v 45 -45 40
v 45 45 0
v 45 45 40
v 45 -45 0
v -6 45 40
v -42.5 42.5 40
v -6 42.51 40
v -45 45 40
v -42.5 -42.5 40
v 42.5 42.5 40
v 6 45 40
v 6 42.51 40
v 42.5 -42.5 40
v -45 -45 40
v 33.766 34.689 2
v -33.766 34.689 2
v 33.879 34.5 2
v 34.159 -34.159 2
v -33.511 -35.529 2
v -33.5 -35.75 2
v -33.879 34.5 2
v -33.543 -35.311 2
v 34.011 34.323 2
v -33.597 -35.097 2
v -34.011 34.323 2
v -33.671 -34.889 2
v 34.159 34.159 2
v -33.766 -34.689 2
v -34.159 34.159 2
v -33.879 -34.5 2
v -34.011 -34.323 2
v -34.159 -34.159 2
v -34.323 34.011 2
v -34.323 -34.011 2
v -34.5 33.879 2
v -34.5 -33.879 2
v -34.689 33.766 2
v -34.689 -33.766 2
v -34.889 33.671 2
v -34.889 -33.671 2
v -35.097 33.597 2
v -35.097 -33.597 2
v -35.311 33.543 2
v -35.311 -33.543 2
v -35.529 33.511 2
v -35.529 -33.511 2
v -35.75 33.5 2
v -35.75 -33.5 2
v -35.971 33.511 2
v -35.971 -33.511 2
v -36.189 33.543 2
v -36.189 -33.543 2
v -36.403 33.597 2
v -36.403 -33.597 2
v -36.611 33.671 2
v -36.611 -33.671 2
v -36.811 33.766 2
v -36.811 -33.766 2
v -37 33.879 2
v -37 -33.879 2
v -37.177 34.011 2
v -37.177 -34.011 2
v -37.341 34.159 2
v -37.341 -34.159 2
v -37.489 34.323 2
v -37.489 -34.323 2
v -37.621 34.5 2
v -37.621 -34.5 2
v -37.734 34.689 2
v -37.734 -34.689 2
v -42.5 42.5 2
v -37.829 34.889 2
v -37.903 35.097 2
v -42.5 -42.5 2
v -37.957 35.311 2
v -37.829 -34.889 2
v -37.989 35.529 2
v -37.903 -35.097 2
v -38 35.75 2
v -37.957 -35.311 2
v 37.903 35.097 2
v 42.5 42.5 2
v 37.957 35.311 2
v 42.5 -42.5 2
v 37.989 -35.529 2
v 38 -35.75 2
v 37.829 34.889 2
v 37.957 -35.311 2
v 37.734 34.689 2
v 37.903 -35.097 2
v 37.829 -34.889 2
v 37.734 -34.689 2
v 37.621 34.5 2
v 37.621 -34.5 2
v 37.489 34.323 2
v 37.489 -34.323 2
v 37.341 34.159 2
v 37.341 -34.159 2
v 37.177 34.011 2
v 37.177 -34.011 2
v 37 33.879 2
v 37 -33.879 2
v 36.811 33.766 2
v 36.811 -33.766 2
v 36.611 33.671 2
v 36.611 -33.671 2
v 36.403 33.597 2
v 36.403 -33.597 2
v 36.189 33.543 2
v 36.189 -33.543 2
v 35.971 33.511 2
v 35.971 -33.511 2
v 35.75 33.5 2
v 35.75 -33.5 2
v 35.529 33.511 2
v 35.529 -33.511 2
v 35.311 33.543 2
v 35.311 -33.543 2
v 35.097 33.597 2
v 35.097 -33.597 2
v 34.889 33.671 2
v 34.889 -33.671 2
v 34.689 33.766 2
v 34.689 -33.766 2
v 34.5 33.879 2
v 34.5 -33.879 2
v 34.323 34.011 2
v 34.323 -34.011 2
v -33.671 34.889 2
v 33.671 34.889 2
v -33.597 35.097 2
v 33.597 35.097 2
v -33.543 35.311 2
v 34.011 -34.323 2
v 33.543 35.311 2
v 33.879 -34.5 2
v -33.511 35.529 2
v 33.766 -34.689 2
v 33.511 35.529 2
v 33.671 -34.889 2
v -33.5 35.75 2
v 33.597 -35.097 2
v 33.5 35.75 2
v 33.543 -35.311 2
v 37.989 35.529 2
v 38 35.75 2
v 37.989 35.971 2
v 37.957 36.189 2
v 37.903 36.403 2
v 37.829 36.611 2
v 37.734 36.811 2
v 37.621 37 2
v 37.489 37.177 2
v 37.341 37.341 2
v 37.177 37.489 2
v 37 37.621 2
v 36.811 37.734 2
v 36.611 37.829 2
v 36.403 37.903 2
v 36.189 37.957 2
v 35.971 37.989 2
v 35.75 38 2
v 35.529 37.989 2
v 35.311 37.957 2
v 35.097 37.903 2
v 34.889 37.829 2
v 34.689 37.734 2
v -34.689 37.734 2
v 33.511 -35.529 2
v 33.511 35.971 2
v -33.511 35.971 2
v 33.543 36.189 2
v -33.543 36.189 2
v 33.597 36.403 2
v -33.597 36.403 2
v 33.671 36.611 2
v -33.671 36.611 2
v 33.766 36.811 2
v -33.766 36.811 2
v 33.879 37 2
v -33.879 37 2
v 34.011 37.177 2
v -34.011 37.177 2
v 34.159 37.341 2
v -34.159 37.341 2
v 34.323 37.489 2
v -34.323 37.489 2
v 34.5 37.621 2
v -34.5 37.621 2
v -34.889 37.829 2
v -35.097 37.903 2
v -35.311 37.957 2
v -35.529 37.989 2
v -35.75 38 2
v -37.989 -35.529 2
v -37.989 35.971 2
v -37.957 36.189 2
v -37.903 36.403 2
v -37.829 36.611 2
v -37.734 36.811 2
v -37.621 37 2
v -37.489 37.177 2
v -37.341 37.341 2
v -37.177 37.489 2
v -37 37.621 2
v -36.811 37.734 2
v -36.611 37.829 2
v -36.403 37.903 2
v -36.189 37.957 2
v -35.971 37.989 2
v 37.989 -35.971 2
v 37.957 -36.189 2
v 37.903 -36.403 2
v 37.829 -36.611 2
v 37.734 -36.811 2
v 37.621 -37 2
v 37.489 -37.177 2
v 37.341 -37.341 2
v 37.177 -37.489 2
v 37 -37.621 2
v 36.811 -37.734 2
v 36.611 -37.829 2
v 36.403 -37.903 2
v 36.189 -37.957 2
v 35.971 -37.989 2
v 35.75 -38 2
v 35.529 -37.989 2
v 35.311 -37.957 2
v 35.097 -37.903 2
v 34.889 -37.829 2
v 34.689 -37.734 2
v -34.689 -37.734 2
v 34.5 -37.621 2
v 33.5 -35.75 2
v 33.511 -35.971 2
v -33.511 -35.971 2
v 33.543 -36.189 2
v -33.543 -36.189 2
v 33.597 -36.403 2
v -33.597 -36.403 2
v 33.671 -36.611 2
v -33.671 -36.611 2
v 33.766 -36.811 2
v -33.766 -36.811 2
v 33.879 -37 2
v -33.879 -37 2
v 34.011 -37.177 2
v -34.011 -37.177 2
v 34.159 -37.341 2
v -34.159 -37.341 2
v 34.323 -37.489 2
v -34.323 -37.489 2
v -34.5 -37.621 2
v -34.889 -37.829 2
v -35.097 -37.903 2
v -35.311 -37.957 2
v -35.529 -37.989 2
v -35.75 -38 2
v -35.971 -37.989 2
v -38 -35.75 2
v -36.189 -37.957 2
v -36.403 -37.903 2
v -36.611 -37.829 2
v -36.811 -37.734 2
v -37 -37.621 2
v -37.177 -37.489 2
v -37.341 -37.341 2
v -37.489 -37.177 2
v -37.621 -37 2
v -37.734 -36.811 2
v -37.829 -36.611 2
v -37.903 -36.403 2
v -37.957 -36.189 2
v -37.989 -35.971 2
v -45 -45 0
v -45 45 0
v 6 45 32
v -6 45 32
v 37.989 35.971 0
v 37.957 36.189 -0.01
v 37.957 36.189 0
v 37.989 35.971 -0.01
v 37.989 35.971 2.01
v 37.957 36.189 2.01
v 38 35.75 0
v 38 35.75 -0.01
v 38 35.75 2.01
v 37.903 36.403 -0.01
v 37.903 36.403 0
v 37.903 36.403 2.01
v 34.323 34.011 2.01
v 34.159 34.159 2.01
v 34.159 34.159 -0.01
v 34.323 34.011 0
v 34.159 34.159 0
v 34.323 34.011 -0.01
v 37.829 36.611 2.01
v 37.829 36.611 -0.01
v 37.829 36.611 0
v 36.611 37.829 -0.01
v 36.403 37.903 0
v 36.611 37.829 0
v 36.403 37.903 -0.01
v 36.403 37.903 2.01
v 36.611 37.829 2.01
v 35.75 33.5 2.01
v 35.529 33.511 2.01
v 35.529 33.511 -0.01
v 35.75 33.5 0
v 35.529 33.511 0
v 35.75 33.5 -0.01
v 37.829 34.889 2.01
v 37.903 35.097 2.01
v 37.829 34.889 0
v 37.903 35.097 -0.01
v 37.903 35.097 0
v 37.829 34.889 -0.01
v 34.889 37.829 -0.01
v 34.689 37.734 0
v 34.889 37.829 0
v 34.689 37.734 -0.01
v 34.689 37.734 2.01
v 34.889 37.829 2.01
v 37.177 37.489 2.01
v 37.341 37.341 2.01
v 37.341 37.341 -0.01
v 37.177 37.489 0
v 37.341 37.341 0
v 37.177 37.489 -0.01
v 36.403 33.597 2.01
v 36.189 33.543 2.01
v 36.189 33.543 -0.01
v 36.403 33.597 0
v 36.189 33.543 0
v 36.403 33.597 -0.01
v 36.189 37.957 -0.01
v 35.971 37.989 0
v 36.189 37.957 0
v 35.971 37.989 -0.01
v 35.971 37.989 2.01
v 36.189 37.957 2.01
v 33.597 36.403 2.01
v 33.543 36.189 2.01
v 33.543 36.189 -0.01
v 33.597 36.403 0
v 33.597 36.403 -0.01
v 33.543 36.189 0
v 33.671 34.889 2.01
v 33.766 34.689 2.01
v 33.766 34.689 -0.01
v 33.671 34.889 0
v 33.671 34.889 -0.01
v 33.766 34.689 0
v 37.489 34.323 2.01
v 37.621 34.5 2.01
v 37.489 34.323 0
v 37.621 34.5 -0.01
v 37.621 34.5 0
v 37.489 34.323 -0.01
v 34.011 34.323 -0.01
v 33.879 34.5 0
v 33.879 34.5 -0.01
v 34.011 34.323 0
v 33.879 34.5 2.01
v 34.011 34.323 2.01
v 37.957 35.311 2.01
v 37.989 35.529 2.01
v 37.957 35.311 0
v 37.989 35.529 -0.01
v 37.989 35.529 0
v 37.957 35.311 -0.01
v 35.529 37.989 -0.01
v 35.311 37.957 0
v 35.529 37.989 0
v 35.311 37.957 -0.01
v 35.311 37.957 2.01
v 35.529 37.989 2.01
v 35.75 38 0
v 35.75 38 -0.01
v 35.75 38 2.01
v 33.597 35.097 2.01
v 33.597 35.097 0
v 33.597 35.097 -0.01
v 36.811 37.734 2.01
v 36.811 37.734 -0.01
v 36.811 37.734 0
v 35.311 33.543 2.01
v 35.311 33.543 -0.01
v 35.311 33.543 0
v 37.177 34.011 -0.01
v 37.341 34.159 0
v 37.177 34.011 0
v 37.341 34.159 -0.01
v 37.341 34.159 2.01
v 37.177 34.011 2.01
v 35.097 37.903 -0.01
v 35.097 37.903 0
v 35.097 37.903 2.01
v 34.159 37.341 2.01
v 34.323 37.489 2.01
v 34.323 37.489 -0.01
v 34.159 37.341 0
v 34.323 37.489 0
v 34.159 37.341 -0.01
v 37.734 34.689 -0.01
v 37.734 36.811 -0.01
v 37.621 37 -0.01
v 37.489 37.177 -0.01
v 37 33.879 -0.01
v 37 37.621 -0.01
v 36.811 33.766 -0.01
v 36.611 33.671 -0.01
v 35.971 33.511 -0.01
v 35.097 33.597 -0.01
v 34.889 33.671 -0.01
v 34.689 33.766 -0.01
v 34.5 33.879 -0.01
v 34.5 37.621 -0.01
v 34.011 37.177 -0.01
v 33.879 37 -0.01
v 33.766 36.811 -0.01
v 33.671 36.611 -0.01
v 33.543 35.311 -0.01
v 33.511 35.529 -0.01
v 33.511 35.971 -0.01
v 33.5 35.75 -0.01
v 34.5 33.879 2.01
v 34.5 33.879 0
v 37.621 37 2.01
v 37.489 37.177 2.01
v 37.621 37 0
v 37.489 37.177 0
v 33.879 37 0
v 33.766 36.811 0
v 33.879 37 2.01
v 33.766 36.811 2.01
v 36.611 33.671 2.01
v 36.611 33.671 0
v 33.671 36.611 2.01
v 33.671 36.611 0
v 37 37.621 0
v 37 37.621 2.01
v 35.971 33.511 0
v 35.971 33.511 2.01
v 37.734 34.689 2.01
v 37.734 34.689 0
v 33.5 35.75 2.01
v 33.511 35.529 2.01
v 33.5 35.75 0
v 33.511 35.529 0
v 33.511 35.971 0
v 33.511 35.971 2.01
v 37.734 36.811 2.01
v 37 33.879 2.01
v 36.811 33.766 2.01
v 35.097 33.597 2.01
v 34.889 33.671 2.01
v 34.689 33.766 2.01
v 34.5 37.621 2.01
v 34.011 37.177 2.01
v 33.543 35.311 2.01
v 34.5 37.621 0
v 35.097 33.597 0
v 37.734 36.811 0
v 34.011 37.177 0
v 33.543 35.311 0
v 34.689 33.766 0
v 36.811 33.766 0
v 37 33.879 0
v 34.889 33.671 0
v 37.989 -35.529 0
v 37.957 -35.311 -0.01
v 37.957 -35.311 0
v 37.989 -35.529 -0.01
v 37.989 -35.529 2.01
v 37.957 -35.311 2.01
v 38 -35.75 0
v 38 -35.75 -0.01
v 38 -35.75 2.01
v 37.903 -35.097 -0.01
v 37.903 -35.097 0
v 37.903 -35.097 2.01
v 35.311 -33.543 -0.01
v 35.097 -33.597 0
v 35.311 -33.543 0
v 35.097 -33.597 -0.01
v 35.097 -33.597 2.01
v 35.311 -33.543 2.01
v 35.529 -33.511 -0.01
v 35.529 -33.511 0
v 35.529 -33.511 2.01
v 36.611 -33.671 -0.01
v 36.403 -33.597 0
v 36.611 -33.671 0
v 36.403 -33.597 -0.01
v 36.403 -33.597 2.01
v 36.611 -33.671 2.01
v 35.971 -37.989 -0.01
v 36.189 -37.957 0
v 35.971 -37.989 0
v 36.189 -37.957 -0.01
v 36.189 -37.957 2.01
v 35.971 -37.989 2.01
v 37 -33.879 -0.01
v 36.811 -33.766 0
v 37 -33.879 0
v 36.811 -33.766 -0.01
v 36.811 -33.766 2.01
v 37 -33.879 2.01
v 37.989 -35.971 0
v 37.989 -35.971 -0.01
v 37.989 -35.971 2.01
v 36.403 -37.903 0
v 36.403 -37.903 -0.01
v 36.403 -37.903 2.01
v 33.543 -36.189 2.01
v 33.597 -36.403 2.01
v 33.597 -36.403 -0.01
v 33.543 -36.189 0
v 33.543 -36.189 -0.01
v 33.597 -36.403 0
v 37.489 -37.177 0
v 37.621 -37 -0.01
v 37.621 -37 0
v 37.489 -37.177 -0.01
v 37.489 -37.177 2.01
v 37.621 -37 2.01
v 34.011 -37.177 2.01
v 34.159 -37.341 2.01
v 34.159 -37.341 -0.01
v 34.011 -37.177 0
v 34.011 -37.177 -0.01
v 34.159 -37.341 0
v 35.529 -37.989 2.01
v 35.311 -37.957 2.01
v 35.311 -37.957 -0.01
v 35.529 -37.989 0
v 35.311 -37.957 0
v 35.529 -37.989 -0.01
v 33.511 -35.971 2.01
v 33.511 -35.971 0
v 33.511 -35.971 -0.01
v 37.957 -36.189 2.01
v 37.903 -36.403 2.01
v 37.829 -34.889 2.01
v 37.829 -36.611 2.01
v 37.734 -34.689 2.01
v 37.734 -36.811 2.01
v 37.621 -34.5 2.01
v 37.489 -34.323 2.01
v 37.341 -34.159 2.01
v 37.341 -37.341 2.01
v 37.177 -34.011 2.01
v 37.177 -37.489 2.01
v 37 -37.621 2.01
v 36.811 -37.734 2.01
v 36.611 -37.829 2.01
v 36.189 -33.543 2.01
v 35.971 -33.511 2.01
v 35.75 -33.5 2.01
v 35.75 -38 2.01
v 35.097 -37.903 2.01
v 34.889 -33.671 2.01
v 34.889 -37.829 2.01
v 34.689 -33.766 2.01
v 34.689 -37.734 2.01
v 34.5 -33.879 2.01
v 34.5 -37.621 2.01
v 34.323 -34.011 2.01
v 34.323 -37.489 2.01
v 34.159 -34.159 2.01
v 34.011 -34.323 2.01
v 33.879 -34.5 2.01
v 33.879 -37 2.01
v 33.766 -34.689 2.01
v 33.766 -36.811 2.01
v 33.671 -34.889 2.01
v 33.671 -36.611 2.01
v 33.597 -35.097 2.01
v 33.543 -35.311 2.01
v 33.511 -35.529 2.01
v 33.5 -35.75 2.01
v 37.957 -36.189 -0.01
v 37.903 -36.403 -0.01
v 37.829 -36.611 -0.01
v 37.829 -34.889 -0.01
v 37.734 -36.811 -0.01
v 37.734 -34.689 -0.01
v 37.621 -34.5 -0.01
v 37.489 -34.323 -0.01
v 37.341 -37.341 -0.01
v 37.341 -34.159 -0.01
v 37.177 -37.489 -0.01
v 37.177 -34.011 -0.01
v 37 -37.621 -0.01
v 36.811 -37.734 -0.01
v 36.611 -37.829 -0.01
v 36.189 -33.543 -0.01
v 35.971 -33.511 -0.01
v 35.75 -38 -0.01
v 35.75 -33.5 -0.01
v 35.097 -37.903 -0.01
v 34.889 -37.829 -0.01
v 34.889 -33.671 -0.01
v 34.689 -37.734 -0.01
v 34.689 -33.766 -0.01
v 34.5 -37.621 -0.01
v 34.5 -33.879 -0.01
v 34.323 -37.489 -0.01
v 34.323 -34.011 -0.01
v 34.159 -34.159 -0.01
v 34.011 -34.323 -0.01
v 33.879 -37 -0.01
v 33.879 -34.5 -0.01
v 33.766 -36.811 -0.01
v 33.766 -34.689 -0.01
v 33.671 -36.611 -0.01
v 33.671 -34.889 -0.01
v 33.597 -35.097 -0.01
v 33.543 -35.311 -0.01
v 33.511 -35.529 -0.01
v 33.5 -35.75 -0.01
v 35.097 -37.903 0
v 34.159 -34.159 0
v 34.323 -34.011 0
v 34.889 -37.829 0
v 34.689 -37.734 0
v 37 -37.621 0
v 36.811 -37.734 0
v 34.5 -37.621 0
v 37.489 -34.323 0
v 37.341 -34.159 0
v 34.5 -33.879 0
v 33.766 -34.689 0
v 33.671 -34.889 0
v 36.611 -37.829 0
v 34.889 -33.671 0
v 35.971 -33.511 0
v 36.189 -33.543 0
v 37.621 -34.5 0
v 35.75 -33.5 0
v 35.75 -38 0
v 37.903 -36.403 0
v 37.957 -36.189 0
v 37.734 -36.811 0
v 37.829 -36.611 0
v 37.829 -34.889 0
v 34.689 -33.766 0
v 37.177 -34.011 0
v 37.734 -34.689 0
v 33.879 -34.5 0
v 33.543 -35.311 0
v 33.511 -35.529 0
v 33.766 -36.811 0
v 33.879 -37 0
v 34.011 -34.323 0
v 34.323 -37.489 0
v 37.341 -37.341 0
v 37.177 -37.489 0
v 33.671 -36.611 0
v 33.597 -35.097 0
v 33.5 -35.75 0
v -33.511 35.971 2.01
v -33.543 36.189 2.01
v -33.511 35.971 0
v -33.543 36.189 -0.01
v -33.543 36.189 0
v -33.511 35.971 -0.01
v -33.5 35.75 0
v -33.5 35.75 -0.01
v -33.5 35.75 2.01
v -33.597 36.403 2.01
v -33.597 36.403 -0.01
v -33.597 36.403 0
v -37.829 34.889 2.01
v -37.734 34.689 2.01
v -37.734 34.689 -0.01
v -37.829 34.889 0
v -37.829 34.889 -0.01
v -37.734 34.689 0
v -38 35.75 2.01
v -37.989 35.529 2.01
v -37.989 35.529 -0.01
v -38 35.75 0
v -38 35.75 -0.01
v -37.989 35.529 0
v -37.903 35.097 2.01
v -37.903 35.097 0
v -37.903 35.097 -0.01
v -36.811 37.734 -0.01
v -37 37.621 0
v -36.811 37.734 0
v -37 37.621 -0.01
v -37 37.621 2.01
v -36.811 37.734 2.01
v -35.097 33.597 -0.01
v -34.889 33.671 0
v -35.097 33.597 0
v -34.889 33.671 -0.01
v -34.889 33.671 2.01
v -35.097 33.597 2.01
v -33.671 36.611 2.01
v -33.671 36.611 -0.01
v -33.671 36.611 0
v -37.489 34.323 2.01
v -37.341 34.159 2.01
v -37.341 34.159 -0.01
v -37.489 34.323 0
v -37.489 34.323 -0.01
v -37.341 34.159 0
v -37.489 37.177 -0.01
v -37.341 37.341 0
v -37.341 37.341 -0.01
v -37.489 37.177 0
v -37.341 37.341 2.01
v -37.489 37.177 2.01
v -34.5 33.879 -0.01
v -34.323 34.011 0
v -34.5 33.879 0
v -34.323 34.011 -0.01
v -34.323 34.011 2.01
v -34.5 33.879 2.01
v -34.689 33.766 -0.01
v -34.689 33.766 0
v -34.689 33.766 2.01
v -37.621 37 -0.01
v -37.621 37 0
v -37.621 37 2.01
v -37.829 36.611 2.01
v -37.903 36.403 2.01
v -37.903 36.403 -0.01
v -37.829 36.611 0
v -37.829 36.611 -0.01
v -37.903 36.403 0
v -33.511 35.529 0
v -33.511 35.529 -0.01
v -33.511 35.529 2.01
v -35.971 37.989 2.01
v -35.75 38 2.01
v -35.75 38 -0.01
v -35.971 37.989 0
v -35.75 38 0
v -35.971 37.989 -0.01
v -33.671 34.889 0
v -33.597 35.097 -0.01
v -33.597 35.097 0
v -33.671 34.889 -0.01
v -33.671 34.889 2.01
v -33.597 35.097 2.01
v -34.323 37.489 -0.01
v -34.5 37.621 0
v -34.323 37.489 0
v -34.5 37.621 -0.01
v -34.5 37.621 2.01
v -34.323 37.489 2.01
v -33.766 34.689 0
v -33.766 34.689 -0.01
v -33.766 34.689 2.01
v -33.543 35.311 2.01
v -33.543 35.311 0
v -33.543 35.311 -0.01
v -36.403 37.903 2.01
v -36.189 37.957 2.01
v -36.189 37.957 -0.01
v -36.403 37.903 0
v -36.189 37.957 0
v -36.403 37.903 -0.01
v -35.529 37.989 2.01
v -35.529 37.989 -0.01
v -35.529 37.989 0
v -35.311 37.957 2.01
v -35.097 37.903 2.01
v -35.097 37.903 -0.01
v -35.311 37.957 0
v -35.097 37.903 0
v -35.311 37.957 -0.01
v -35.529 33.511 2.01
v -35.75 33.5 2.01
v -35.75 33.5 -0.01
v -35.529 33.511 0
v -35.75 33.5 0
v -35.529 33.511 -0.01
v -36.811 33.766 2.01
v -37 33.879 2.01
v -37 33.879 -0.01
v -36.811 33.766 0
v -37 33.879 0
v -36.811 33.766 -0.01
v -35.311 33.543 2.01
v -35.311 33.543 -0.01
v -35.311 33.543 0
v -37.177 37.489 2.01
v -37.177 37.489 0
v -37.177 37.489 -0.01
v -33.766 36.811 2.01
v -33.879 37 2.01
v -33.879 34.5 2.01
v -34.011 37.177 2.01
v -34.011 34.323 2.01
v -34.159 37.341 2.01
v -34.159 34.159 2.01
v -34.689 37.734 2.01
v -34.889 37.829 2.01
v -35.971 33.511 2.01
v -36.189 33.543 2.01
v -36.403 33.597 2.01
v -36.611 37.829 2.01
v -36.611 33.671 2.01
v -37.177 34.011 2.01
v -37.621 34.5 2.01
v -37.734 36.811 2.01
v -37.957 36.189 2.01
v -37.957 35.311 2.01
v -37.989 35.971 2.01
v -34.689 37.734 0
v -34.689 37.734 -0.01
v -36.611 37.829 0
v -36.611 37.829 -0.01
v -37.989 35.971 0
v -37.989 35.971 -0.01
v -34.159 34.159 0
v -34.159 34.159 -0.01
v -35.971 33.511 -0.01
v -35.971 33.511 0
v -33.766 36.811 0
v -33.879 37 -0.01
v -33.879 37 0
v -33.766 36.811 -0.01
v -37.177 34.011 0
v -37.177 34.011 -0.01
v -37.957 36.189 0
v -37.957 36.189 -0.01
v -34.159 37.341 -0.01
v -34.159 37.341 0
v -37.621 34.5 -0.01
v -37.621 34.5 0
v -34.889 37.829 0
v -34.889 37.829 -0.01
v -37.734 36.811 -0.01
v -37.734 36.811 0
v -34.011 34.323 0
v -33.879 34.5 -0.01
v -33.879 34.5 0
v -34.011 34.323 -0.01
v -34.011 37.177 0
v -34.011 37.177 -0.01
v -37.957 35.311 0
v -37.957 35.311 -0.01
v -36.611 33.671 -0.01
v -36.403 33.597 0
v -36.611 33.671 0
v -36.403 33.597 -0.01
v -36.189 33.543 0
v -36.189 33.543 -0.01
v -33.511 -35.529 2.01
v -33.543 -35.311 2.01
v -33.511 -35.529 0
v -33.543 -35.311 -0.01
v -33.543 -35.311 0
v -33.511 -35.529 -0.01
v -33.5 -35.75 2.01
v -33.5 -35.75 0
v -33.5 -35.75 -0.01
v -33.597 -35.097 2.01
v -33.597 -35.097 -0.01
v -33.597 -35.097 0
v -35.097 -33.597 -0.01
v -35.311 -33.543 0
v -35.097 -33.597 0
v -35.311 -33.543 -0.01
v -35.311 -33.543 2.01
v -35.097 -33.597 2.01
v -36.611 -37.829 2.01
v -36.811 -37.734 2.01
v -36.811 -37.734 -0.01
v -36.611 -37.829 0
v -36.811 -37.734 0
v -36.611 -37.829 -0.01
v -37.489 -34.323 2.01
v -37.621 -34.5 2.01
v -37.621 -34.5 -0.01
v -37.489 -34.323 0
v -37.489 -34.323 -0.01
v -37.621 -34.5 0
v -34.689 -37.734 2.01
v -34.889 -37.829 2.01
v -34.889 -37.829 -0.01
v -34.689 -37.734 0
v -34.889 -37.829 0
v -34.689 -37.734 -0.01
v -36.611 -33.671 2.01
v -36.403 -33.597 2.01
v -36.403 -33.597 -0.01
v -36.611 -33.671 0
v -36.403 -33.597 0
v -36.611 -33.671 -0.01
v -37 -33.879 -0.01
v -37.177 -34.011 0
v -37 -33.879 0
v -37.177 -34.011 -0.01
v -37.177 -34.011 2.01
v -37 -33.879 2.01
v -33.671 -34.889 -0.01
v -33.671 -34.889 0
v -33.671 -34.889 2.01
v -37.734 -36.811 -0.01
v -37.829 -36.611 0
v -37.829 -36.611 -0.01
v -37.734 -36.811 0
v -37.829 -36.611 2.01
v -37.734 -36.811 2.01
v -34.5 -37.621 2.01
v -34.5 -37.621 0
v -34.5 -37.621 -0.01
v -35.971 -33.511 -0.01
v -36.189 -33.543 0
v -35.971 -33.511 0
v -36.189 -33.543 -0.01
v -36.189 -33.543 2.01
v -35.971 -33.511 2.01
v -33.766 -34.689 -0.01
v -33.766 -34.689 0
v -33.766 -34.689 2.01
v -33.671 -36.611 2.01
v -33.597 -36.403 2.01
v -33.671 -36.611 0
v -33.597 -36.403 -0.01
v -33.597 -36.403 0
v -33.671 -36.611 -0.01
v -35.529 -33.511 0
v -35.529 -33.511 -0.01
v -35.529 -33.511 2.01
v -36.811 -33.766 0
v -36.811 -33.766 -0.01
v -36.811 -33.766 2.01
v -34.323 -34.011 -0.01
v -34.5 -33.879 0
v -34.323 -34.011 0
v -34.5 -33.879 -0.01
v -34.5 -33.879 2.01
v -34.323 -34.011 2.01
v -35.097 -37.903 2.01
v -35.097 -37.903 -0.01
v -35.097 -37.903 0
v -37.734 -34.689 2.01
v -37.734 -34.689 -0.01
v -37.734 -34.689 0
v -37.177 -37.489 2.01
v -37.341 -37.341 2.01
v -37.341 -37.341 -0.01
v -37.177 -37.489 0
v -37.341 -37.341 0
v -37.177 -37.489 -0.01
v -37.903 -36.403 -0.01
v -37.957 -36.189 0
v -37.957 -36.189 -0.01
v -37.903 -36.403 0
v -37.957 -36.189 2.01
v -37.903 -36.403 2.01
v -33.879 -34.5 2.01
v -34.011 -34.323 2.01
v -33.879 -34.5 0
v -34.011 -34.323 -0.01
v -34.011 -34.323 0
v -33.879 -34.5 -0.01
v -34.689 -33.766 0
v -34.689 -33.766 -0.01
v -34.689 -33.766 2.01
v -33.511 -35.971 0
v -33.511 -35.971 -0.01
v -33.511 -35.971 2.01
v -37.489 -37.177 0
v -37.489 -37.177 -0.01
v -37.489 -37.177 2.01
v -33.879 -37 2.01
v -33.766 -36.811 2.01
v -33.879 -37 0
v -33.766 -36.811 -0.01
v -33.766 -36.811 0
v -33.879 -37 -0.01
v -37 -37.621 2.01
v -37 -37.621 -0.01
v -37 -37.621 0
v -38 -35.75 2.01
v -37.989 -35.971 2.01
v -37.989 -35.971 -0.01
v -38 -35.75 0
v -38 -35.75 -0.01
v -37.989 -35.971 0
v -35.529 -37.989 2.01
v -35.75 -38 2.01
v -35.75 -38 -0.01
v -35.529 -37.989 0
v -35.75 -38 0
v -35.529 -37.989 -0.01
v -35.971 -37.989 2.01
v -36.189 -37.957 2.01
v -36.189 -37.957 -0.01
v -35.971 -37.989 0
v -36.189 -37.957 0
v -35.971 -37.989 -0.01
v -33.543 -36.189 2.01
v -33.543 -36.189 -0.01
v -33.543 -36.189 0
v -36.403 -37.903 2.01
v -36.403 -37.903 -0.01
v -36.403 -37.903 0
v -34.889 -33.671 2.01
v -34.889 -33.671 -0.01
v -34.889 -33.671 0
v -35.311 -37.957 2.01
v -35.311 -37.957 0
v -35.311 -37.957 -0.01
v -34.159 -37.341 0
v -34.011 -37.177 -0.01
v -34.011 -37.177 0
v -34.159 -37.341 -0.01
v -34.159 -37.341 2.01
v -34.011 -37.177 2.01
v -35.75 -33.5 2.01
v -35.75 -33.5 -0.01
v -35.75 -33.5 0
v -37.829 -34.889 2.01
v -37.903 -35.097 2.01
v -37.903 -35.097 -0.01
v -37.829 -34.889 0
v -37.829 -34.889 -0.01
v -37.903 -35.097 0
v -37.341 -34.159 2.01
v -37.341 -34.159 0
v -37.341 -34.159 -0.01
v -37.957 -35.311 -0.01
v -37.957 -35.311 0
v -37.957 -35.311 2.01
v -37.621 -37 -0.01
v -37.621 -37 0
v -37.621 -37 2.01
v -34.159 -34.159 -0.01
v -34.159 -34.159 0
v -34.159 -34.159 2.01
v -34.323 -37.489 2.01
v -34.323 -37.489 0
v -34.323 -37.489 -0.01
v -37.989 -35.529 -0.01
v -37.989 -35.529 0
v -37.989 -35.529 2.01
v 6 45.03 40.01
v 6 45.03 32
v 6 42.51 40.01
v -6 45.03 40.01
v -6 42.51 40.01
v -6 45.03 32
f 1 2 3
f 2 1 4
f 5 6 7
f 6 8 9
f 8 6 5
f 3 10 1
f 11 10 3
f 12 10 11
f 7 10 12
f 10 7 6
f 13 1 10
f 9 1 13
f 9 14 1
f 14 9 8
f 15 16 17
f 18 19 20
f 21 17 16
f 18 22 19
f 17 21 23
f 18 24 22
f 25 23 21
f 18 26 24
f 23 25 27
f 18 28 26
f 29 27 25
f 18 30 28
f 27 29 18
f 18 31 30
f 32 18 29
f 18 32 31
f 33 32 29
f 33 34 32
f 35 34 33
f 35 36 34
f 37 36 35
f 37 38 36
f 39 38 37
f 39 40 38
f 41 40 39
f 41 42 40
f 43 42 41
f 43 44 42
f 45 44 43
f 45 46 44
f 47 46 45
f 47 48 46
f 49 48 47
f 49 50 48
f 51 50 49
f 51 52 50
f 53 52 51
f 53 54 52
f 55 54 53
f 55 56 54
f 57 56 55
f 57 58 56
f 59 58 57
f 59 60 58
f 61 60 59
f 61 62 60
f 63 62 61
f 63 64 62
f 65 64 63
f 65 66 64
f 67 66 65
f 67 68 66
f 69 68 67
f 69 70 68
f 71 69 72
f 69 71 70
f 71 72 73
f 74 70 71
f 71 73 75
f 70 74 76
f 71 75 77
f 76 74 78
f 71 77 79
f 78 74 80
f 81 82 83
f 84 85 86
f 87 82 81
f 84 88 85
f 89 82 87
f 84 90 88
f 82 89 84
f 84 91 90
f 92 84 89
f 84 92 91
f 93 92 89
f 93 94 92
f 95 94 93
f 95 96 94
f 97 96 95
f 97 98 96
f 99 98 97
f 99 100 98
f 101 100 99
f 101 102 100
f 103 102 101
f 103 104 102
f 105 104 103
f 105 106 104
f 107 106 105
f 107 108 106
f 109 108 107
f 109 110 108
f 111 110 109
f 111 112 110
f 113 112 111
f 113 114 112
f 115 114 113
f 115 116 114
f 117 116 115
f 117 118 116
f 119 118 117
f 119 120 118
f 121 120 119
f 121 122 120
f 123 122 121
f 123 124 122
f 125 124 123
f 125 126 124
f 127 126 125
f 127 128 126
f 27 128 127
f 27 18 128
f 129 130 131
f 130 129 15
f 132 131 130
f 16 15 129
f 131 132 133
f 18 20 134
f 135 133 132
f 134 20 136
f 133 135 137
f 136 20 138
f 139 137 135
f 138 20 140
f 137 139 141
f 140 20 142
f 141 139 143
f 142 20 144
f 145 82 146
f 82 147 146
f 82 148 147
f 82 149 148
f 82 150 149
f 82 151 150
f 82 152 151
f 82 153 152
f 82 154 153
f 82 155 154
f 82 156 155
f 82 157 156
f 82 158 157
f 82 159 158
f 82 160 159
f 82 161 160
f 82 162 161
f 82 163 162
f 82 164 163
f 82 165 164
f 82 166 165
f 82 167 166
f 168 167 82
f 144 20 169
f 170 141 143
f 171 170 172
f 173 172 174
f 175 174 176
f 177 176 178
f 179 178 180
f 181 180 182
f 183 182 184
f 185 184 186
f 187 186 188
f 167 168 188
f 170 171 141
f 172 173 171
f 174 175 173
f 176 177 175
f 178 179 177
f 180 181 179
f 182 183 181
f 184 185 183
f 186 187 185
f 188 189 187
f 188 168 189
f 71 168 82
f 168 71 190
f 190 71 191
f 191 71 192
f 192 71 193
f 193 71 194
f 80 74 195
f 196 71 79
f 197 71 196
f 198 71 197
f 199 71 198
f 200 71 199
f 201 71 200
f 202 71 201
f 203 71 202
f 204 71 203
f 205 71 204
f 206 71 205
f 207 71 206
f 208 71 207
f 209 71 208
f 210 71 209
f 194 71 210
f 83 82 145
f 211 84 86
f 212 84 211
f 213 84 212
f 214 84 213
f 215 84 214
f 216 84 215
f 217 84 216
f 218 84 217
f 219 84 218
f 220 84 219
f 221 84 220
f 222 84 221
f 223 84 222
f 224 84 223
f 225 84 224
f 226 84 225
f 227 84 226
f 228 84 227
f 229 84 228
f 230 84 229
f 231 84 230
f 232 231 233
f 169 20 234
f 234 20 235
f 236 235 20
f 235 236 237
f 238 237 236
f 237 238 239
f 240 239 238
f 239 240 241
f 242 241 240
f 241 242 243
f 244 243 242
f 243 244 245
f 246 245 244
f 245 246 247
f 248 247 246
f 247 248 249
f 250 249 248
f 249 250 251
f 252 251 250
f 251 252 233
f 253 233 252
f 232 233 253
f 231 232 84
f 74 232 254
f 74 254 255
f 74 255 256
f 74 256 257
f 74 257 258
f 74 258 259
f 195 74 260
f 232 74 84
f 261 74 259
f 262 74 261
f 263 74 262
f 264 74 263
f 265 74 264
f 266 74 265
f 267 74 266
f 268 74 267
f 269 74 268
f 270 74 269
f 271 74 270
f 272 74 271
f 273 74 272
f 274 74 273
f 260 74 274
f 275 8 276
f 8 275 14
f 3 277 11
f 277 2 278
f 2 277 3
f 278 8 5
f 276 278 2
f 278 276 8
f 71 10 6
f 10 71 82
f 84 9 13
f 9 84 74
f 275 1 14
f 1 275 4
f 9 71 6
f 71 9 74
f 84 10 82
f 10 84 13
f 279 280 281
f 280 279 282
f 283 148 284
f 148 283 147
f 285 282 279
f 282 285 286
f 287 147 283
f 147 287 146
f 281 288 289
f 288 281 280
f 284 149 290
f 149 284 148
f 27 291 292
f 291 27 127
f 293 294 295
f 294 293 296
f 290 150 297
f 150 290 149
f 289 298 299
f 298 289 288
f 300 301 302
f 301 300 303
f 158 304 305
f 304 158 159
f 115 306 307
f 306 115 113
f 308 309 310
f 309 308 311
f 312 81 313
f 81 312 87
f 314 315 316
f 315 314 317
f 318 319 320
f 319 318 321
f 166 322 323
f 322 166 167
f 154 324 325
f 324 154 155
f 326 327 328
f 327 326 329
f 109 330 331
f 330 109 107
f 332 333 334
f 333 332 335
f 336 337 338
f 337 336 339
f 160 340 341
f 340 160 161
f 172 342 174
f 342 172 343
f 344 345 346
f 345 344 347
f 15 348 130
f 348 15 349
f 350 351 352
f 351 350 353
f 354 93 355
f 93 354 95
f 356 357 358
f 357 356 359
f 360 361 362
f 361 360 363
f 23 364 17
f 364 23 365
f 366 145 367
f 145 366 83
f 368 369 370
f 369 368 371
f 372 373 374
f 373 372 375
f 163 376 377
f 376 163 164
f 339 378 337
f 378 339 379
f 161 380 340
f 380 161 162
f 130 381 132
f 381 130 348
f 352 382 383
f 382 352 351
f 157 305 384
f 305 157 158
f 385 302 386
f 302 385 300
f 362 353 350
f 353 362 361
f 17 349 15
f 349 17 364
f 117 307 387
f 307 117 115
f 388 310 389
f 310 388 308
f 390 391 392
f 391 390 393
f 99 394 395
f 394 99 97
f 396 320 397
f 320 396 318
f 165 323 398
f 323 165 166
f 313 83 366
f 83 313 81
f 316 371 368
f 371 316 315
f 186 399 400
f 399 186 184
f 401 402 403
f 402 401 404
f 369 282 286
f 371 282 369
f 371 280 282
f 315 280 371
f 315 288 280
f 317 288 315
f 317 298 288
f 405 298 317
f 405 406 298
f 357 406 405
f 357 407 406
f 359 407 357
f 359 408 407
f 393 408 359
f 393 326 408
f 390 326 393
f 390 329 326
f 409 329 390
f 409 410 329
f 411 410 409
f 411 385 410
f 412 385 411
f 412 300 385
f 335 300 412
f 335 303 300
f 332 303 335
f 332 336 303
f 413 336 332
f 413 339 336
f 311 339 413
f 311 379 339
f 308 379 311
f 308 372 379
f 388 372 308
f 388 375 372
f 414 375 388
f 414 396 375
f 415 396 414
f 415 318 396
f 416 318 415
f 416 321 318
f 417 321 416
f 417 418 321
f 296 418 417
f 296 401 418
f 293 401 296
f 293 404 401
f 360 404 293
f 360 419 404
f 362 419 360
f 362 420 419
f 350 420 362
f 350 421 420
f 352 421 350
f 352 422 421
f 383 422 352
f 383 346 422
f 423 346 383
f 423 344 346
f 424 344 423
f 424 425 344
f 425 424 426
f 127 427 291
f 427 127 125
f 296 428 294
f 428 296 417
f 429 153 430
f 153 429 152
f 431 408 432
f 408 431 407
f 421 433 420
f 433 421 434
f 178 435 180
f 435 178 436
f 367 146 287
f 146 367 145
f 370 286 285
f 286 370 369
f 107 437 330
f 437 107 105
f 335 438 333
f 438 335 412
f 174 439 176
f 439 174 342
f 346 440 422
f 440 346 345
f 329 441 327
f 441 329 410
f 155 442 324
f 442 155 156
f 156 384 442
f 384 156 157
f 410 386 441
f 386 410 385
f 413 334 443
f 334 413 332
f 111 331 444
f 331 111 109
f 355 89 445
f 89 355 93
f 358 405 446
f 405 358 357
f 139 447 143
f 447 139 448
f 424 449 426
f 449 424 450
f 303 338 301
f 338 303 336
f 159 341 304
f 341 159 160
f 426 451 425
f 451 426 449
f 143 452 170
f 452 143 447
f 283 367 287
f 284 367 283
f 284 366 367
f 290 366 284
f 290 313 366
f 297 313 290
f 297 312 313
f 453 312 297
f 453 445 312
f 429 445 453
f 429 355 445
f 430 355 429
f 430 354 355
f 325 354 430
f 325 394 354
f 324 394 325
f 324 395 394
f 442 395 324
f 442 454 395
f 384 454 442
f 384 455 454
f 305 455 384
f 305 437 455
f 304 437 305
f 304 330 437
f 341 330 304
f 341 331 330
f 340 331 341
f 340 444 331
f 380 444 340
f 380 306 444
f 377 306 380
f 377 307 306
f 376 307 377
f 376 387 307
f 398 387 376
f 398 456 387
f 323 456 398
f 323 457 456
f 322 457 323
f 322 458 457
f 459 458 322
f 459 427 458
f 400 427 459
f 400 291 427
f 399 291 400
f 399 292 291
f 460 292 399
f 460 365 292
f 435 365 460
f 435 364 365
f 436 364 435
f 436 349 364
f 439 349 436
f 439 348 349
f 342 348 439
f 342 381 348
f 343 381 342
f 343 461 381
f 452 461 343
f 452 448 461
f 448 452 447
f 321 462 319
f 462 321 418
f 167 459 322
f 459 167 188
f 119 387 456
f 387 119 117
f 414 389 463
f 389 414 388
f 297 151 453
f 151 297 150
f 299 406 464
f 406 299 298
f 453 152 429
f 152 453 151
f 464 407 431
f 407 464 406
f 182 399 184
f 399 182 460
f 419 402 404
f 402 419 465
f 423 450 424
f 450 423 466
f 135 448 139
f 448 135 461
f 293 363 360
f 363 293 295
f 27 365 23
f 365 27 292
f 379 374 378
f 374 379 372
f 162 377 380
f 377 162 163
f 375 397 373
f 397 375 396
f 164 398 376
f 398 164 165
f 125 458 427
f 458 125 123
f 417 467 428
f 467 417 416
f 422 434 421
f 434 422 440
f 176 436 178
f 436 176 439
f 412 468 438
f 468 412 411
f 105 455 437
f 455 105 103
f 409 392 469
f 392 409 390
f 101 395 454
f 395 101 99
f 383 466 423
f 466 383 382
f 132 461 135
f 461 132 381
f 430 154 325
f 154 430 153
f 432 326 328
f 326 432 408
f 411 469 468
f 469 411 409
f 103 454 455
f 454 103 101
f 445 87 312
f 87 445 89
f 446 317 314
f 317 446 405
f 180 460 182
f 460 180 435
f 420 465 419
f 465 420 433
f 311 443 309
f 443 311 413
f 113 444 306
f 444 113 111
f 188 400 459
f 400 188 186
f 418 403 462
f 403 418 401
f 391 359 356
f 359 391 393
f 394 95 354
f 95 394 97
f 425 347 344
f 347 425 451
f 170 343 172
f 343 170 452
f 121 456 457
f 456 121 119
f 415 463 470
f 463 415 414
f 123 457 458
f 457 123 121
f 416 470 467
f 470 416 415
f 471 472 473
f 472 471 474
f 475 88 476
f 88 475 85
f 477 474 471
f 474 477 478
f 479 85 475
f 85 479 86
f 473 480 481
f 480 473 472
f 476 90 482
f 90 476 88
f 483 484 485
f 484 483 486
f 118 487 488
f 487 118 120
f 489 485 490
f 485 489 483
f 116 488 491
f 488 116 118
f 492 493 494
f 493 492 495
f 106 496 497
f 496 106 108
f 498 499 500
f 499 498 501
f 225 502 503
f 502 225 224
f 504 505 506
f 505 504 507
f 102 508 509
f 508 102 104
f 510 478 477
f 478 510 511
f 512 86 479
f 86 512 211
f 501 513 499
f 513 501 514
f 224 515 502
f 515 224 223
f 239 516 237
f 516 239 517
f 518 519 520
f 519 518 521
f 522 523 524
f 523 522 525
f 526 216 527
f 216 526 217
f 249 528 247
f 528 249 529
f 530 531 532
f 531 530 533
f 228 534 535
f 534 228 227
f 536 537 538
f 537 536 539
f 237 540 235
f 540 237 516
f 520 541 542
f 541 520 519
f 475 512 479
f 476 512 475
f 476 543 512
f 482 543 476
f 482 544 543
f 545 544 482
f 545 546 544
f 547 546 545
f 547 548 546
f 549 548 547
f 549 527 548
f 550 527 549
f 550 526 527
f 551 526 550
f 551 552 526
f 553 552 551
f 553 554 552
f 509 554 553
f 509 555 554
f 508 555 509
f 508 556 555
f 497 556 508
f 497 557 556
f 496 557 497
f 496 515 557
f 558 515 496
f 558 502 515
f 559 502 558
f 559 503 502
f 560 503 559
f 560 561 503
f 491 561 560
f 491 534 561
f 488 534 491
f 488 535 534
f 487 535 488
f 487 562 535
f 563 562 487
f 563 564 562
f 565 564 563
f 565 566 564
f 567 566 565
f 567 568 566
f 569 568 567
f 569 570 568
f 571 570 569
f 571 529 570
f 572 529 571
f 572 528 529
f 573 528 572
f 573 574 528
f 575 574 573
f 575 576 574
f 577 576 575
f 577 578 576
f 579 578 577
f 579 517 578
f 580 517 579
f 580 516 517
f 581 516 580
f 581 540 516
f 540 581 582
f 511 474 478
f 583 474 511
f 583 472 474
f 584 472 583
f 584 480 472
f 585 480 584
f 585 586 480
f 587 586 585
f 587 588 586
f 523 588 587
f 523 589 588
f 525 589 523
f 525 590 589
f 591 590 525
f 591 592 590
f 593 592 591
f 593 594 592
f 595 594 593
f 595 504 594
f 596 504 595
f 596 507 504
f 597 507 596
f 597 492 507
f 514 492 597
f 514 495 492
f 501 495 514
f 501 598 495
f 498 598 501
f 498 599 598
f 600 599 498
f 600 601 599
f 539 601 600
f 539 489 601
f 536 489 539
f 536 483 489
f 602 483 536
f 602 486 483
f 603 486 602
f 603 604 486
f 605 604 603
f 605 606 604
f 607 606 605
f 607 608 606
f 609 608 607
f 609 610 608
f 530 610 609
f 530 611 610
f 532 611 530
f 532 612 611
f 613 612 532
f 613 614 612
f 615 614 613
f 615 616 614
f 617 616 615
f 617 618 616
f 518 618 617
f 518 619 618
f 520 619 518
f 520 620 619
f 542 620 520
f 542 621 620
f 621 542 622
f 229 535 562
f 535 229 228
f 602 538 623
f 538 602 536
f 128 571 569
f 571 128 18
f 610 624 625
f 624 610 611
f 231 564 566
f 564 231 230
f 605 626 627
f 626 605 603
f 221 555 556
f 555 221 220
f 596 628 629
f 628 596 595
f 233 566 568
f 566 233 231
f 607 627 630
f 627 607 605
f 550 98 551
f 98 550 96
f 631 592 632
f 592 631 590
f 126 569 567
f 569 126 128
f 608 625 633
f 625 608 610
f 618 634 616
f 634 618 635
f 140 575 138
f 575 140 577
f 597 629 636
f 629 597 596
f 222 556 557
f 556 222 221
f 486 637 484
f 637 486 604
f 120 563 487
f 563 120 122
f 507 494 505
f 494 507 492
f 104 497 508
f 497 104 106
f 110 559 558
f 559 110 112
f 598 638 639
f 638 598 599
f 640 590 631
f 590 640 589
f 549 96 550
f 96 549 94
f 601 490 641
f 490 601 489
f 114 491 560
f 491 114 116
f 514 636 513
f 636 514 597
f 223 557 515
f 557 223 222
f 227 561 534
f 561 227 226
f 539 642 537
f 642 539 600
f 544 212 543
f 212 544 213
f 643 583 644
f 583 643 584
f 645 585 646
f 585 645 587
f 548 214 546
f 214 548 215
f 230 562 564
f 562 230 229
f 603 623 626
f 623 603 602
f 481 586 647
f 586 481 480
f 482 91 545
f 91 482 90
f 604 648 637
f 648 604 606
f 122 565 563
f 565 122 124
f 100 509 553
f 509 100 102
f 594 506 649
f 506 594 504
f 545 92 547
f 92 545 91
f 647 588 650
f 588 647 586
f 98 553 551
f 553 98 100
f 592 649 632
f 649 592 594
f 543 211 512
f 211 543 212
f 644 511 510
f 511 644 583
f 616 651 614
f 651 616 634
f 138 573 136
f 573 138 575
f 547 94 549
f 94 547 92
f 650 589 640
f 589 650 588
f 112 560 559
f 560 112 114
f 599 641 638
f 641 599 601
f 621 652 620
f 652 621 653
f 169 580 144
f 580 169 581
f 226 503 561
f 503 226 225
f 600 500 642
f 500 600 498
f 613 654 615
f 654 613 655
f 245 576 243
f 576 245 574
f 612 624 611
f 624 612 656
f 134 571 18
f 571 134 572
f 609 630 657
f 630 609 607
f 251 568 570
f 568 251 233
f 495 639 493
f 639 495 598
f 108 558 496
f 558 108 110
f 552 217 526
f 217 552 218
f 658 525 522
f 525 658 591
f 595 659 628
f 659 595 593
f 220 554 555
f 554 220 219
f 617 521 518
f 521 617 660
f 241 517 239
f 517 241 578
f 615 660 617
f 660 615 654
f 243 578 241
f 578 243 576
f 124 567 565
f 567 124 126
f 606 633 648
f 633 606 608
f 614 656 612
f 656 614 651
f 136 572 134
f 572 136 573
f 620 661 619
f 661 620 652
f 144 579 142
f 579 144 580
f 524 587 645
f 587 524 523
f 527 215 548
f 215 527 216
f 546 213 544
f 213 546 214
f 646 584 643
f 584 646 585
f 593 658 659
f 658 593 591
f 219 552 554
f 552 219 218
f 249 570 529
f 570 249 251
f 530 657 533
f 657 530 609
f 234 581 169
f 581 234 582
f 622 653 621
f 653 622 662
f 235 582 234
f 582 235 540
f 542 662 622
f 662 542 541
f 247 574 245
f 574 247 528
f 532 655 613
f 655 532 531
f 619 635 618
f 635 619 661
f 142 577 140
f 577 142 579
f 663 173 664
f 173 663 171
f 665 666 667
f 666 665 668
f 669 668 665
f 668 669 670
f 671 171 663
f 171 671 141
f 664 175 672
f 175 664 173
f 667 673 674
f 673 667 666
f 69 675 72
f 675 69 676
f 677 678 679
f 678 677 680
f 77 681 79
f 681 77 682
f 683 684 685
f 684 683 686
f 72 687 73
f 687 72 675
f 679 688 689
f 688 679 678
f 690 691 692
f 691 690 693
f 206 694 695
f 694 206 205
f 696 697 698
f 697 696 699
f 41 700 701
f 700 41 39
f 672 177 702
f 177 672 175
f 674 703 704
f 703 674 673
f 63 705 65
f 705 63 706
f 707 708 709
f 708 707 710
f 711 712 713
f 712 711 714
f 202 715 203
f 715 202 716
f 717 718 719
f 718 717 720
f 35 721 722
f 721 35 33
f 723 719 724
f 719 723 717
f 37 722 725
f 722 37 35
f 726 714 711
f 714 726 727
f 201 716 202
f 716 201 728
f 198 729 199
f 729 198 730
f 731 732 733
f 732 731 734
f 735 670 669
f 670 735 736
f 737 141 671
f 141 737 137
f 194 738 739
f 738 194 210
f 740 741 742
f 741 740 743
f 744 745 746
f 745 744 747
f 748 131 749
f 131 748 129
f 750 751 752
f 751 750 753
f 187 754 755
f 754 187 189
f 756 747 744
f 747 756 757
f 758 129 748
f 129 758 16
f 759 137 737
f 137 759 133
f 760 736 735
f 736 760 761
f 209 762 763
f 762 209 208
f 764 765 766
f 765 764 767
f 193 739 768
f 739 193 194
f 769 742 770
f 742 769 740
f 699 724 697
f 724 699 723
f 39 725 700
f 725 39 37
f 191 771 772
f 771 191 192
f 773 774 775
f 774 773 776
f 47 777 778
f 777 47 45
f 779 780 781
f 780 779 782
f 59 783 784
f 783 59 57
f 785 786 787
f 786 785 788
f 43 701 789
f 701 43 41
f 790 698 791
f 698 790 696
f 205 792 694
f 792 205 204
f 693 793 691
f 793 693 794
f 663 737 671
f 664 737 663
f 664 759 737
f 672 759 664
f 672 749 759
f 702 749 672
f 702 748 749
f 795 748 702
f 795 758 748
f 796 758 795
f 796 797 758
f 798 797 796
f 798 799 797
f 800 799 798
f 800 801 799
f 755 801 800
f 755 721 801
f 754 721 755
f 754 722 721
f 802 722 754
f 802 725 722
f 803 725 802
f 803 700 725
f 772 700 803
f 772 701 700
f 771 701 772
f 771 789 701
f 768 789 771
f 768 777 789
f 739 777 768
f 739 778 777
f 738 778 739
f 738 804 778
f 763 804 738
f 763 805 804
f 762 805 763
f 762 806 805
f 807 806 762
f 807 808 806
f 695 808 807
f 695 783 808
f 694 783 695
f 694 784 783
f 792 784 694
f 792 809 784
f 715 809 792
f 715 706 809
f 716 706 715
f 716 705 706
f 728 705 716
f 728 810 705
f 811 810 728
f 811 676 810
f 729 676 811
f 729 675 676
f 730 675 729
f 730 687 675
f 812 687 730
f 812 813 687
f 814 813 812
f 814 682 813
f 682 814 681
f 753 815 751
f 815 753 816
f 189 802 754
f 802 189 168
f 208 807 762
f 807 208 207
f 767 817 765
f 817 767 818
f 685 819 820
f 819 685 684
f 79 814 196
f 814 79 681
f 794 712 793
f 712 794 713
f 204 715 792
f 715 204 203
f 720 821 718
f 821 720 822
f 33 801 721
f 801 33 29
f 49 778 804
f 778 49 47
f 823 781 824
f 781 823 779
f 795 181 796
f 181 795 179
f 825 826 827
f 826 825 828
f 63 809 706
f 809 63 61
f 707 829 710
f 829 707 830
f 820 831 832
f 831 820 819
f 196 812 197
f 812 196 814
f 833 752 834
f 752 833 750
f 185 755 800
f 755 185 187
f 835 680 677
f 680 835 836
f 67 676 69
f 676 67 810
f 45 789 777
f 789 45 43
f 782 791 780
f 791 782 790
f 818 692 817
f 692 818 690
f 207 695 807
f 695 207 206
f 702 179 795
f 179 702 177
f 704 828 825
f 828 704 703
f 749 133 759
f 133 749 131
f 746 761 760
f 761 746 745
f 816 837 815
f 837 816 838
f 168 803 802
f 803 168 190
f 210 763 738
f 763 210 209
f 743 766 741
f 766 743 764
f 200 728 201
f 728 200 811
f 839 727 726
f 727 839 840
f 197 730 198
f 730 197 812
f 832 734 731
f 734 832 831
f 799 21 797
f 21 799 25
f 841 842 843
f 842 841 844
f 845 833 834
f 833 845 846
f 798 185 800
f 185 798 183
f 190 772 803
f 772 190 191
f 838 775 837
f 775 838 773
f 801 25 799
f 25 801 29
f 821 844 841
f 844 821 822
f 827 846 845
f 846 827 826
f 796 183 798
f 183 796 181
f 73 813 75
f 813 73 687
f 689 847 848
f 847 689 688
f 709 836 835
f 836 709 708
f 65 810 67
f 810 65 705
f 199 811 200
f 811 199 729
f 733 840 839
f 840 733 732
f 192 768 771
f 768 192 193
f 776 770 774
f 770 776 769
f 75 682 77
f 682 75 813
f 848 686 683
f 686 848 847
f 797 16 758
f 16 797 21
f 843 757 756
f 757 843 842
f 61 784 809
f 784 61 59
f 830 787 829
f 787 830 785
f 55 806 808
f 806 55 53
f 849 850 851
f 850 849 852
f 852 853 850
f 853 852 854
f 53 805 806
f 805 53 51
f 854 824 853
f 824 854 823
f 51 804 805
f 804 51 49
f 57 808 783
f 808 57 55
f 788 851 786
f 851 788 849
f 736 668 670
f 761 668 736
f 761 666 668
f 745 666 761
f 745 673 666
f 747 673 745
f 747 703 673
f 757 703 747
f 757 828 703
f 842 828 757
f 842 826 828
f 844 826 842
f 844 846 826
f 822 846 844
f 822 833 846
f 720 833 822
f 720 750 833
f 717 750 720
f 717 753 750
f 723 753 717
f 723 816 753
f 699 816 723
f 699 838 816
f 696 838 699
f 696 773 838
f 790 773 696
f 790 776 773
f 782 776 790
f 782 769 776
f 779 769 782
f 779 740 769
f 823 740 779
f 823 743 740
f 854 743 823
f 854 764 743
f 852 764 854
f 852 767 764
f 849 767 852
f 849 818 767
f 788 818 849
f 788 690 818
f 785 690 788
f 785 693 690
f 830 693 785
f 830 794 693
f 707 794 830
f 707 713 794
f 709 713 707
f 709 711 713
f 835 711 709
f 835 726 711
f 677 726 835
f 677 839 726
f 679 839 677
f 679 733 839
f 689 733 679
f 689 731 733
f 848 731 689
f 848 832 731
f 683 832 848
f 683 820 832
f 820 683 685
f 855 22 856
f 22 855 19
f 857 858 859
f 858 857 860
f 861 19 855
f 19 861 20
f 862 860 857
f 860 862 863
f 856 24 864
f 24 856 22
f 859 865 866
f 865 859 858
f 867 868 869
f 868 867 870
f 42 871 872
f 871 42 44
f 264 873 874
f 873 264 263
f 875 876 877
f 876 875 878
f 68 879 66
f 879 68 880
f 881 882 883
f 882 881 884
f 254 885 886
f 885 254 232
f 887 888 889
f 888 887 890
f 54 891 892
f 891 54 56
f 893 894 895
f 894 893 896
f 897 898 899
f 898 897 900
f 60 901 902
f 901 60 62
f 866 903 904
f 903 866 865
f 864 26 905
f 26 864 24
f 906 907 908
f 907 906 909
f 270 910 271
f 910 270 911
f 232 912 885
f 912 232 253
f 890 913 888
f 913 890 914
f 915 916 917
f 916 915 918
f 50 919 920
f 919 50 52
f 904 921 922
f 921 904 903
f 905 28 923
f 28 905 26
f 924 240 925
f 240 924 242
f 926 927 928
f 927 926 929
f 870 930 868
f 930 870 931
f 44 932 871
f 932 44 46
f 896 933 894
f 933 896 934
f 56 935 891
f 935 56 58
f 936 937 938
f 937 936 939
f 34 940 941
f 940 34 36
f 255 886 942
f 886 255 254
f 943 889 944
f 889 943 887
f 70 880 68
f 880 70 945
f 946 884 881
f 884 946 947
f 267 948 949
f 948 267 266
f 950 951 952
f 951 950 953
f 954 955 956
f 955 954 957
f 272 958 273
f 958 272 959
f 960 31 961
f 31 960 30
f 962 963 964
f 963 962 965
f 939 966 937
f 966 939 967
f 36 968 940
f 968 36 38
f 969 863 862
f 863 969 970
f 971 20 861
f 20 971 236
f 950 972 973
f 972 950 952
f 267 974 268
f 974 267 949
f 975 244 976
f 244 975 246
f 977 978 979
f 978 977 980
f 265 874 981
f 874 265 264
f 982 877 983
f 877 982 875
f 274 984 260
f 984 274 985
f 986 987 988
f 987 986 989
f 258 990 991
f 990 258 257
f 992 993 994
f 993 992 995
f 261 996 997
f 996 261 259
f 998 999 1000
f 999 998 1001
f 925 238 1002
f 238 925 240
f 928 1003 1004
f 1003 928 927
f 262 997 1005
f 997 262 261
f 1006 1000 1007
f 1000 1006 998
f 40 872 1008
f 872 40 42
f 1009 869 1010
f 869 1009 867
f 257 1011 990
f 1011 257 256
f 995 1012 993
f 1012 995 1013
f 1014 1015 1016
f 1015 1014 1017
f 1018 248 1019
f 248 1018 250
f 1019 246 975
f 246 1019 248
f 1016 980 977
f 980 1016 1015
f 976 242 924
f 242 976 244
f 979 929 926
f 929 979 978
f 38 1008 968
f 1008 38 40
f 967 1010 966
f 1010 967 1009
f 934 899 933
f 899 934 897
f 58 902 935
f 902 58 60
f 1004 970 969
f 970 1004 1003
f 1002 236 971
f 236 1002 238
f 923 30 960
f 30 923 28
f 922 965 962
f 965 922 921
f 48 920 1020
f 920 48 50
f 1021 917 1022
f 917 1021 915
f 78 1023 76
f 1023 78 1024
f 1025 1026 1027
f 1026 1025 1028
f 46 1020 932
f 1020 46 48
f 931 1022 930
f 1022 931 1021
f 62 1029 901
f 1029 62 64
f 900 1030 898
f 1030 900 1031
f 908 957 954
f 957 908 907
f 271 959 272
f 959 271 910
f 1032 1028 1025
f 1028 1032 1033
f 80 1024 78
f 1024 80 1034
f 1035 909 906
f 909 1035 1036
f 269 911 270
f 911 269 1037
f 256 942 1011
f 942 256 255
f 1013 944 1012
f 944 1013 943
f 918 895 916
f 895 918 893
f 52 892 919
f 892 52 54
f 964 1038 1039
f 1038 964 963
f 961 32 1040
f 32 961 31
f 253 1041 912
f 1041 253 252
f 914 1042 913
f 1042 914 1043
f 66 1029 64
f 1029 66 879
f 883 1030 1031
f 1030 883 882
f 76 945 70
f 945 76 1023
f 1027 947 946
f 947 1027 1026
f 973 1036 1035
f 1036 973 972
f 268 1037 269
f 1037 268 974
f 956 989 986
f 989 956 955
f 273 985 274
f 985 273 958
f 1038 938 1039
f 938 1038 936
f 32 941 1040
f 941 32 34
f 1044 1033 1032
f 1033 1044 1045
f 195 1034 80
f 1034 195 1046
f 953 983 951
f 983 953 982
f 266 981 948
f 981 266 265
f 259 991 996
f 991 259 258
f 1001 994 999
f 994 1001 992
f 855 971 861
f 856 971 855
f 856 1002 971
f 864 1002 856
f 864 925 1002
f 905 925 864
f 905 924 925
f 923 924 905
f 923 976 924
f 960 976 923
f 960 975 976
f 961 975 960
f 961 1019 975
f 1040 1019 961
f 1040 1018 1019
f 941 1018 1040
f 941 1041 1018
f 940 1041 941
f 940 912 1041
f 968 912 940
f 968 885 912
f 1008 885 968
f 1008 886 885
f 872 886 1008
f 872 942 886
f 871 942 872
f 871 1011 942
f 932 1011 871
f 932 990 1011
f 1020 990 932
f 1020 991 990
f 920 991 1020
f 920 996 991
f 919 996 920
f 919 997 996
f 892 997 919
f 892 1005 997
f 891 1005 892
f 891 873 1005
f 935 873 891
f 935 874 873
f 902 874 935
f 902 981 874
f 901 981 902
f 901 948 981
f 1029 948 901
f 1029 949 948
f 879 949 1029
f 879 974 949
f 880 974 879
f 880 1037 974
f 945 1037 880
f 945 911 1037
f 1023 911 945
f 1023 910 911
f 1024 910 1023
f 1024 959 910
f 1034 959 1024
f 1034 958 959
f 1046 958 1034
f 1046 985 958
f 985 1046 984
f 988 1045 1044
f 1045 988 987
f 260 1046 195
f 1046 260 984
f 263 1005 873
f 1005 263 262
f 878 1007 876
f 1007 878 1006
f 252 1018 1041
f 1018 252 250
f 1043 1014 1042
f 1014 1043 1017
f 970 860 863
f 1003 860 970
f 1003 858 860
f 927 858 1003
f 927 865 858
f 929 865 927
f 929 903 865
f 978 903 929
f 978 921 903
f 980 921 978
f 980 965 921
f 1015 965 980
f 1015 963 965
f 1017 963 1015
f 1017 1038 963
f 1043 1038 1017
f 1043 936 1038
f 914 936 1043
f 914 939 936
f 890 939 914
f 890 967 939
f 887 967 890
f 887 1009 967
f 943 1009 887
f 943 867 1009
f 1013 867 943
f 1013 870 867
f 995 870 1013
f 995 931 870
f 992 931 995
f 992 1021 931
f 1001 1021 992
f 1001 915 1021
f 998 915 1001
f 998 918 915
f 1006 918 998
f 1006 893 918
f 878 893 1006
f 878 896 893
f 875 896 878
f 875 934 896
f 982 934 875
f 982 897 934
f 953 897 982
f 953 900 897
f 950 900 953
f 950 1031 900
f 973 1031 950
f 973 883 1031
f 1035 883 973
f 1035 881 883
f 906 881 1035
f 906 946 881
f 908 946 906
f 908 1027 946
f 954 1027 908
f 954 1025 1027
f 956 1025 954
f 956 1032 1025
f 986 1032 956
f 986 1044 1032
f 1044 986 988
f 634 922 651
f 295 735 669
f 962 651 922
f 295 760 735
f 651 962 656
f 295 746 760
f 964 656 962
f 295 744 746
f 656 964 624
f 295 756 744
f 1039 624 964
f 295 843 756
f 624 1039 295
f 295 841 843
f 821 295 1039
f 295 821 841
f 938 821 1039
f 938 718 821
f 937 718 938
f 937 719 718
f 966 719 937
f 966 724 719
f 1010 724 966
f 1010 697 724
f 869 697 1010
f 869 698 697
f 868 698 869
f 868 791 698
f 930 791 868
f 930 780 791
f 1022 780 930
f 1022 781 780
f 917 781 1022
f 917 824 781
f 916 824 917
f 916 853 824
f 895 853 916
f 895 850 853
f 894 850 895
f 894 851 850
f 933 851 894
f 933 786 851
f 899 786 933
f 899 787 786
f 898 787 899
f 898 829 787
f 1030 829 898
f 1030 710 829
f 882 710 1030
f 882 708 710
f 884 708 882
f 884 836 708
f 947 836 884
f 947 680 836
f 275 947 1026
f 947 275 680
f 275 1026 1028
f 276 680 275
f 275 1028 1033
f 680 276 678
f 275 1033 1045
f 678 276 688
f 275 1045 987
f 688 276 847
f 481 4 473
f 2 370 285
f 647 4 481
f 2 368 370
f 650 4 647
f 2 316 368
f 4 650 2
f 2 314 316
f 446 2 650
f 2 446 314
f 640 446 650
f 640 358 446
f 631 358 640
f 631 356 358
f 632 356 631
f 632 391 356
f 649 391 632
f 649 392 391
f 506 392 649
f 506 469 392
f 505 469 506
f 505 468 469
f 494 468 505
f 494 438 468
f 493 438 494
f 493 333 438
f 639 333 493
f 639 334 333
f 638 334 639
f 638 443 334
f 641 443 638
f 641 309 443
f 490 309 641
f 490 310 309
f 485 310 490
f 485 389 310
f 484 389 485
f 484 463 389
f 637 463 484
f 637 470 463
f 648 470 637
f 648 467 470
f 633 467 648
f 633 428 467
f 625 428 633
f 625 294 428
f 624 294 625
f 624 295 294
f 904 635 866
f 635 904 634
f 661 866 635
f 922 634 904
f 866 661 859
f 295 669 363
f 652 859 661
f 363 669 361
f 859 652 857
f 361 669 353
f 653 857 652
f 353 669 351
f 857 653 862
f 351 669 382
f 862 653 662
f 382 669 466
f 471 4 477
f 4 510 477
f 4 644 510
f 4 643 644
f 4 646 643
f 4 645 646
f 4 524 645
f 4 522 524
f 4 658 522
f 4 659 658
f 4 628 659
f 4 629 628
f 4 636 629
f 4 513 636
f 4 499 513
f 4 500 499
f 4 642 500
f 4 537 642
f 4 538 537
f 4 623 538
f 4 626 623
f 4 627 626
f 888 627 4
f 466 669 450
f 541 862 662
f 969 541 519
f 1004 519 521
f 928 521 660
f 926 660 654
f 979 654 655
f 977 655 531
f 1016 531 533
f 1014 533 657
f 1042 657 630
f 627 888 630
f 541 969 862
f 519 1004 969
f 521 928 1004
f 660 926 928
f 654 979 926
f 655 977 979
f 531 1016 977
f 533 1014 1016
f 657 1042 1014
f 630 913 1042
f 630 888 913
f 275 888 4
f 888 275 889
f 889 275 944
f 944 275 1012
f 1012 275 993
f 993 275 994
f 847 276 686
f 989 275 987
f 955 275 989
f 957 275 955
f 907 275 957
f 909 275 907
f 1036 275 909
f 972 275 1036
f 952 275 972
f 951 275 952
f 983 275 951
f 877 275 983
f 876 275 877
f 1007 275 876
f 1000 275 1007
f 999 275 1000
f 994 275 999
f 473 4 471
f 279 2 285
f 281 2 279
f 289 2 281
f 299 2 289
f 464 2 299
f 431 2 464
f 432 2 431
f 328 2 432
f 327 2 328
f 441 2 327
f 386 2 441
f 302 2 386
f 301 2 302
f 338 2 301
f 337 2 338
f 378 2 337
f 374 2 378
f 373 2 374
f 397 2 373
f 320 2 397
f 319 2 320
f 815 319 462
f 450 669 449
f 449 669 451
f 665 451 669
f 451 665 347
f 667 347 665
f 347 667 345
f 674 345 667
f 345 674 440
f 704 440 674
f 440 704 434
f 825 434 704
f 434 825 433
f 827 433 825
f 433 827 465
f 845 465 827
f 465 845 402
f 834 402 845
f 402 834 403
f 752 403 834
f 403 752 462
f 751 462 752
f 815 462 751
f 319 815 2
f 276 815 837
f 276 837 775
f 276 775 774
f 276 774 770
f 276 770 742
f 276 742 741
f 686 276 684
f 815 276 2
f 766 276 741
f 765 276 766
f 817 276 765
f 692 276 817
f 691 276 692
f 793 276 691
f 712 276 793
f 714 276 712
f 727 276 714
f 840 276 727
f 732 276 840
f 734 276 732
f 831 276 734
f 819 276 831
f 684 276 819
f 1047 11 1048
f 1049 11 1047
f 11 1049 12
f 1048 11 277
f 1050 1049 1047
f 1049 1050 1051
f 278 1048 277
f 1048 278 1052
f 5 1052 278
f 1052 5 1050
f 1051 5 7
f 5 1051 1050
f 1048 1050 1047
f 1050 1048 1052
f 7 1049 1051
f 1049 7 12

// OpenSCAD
// DIY Magnetic Stirrer Housing
// Dimensions in mm

// Parameters
outer_size = 90;           // Outer X/Y size of the housing
wall_thickness = 2.5;      // Wall thickness
top_thickness = 2;         // Top plate thickness
height = 40;               // Total height (from top plate to open top)
hole_pattern = 71.5;       // Screw hole pattern square size
hole_diameter = 4.5;       // Screw hole diameter
notch_width = 12;          // Power cable notch width
notch_depth = 8;           // Notch depth from top (40 - 32 = 8)
notch_height_start = 32;   // Notch starts at z = 32

// Set resolution for curves
$fn = 64;

// Calculate inner dimensions
inner_size = outer_size - 2 * wall_thickness;

// Base plate (top plate in use, printed flat at z=0)
module base_plate() {
    size = outer_size;
    translate([-(size/2), -(size/2), 0]) {
        cube([size, size, top_thickness]);
    }
}

// Walls
module walls() {
    // Front wall (Y+ side)
    translate([-(outer_size/2), (outer_size/2) - wall_thickness, top_thickness]) {
        cube([outer_size, wall_thickness, height - top_thickness]);
    }
    
    // Back wall (Y- side)
    translate([-(outer_size/2), -(outer_size/2), top_thickness]) {
        cube([outer_size, wall_thickness, height - top_thickness]);
    }
    
    // Left wall (X- side)
    translate([-(outer_size/2), -(outer_size/2), top_thickness]) {
        cube([wall_thickness, outer_size, height - top_thickness]);
    }
    
    // Right wall (X+ side)
    translate([(outer_size/2) - wall_thickness, -(outer_size/2), top_thickness]) {
        cube([wall_thickness, outer_size, height - top_thickness]);
    }
}

// Screw holes (4.5mm for M4 screws) - only through top plate
module screw_holes() {
    half_pattern = hole_pattern / 2;
    hole_radius = hole_diameter / 2;
    
    // Positions of the four holes relative to center
    positions = [
        [half_pattern, half_pattern],
        [half_pattern, -half_pattern],
        [-half_pattern, half_pattern],
        [-half_pattern, -half_pattern]
    ];
    
    for (i = [0:3]) {
        translate([positions[i][0], positions[i][1], -0.01]) {
            cylinder(h = top_thickness + 0.02, r = hole_radius);
        }
    }
}

// Power cable notch - only in front wall
module notch() {
    // Notch in the front wall (Y+ side)
    // Centered along the wall (X direction), 12mm wide
    // Extends from z = 32 to z = 40 (height - notch_depth to height)
    translate([-(notch_width/2), (outer_size/2) - wall_thickness + 0.01, notch_height_start]) {
        cube([notch_width, wall_thickness + 0.02, height - notch_height_start + 0.01]);
    }
}

// Assemble the housing
module housing() {
    union() {
        // Base plate
        base_plate();
        
        // Walls
        walls();
        
        // Subtract screw holes (only through top plate)
        translate([0, 0, 0]) {
            screw_holes();
        }
        
        // Subtract notch
        notch();
    }
}

// Build the housing
housing();
